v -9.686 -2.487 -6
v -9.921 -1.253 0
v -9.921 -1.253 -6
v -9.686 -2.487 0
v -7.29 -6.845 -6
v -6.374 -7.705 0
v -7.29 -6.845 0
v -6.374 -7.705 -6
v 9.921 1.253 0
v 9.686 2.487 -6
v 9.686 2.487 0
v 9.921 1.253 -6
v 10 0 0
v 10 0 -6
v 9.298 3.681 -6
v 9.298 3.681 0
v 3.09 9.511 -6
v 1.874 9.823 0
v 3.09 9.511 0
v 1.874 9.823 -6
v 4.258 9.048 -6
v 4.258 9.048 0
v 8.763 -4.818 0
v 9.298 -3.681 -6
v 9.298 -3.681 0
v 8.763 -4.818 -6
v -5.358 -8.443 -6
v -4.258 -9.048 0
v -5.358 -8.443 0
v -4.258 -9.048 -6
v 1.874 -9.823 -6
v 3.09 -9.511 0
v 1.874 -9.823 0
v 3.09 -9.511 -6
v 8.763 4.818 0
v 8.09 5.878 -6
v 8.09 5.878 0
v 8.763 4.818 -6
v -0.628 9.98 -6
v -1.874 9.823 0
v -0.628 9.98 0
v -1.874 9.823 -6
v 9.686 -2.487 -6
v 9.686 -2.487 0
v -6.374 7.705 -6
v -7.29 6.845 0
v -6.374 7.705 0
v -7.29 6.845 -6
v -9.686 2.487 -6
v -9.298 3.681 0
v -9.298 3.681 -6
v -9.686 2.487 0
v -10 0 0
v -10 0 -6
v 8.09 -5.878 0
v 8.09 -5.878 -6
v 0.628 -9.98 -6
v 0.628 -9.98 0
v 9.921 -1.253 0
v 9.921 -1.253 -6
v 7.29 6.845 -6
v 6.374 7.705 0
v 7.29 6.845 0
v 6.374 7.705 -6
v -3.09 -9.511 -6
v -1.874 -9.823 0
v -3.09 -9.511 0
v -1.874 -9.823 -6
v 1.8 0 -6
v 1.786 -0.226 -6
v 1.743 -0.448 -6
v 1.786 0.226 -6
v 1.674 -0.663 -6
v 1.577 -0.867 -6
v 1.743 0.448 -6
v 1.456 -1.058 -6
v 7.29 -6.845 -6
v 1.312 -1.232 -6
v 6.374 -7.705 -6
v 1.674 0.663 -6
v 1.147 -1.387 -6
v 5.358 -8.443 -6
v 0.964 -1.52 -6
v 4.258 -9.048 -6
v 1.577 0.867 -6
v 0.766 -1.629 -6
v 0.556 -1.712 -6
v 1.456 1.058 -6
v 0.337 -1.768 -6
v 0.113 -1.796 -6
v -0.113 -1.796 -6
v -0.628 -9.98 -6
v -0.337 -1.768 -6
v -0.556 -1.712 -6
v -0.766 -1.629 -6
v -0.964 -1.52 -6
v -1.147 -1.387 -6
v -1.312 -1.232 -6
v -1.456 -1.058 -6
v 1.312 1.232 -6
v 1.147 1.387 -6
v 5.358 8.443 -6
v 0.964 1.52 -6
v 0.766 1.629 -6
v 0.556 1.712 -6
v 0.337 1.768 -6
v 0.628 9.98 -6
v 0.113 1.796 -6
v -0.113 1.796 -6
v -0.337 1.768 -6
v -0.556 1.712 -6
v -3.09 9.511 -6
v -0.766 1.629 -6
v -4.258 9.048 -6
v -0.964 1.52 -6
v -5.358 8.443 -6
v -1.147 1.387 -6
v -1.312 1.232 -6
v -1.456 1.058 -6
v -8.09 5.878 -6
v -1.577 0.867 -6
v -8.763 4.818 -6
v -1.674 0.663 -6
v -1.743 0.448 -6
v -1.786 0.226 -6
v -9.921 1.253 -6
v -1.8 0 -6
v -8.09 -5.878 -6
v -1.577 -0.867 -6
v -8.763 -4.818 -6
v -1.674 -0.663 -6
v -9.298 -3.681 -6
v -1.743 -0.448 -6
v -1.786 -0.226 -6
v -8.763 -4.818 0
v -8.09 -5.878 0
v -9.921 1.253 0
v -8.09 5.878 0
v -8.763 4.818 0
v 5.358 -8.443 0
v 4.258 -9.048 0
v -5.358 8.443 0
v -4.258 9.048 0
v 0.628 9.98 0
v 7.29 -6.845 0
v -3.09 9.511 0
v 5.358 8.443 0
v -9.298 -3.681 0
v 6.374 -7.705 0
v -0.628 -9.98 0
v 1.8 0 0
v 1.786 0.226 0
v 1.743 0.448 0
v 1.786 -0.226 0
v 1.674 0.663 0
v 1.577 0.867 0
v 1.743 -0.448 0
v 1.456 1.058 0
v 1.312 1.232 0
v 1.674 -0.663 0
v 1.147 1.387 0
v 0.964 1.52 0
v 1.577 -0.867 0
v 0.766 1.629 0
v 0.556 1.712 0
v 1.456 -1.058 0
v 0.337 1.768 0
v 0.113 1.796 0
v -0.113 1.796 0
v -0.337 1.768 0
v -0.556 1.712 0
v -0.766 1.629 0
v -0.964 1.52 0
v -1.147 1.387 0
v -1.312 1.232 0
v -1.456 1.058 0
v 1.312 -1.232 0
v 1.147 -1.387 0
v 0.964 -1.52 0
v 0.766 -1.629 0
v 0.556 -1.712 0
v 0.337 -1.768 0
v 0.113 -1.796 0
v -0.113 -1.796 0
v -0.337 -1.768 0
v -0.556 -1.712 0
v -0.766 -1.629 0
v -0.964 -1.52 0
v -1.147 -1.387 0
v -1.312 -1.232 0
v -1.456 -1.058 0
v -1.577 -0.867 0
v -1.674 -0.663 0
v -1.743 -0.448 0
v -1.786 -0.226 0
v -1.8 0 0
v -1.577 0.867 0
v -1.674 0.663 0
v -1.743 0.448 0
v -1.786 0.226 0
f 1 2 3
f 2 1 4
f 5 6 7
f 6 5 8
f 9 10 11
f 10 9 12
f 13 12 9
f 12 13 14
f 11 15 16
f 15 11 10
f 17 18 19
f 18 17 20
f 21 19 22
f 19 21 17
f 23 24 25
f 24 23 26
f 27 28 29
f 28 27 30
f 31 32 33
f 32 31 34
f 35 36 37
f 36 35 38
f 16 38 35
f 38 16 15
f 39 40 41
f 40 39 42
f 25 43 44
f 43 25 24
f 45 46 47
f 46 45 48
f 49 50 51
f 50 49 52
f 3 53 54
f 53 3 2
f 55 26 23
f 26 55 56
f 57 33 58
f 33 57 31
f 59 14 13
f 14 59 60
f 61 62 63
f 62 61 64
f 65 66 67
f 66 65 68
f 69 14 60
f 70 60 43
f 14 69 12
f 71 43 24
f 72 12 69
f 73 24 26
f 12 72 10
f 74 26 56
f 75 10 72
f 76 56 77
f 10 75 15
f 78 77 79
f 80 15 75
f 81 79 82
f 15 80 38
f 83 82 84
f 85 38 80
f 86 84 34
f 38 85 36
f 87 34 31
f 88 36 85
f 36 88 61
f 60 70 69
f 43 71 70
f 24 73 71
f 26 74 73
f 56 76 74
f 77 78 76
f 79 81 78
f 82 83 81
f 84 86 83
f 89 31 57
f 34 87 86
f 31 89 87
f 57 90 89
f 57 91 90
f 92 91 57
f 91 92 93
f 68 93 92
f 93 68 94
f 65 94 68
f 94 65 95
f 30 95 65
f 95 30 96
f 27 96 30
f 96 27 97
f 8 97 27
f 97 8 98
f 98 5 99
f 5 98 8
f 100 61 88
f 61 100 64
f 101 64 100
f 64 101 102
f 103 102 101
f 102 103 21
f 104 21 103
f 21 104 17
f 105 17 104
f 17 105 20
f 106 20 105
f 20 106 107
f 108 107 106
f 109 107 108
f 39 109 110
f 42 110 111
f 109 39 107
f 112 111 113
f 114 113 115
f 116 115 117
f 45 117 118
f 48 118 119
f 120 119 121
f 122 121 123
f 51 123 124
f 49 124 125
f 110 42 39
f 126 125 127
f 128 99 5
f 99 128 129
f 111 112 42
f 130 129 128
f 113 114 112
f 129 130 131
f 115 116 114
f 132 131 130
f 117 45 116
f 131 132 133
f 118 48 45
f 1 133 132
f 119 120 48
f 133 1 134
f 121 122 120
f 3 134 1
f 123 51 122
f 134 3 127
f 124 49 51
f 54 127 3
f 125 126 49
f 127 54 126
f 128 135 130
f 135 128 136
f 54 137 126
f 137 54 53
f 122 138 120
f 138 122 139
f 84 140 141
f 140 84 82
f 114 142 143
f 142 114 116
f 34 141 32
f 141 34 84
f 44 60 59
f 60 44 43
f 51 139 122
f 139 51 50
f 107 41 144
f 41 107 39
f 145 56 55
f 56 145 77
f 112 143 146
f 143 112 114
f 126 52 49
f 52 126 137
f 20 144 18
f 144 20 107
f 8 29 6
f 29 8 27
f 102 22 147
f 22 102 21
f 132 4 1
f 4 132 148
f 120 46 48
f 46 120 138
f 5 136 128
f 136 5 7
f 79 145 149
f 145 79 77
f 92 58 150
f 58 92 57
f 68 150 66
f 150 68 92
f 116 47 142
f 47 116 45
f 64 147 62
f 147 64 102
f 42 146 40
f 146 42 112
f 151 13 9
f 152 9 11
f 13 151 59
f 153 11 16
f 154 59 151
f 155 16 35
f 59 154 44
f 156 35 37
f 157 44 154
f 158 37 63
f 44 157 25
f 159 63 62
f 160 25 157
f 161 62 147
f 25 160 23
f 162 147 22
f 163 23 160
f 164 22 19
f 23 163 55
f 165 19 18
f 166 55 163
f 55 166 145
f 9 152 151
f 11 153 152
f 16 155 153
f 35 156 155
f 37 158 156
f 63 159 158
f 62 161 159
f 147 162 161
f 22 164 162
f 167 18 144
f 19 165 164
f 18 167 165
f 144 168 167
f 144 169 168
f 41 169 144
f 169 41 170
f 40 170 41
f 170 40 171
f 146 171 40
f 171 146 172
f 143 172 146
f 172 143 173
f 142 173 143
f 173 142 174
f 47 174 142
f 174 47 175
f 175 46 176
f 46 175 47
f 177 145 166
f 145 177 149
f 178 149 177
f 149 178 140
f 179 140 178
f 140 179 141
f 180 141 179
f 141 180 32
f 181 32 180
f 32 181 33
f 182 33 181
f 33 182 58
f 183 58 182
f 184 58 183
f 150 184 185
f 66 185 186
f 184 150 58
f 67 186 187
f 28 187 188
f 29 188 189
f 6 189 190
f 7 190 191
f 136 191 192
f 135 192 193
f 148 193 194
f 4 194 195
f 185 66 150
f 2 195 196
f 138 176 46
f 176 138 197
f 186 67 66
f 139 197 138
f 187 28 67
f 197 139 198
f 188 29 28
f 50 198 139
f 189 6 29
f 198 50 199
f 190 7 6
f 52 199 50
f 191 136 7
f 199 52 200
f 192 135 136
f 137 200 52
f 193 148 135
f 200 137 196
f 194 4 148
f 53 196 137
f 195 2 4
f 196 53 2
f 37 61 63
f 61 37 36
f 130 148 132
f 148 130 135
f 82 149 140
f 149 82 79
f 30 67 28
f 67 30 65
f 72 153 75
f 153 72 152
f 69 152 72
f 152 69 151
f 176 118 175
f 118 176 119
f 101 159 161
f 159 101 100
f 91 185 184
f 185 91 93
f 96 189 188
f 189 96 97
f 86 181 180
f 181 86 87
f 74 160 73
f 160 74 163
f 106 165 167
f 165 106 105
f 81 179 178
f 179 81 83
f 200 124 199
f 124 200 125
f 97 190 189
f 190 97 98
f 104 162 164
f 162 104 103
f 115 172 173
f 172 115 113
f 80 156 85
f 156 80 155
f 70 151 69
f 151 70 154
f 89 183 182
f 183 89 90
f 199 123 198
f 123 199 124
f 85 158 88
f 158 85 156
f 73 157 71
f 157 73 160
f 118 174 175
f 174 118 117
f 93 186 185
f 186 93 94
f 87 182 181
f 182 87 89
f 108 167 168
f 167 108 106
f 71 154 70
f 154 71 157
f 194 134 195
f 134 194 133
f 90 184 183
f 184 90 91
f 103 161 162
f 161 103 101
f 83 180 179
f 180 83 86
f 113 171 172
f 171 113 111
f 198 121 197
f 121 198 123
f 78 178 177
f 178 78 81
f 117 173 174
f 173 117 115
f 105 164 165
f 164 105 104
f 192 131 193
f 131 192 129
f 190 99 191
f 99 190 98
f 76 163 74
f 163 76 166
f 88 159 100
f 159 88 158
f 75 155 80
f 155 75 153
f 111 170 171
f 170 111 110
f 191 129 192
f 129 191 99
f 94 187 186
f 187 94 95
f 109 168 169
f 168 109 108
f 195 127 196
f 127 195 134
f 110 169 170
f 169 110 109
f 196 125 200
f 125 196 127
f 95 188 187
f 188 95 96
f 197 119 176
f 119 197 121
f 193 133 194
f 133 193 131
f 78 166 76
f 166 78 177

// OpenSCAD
$fn = 50;


difference() {
	union() {
		translate(v = [0, 0, -6.0000000000]) {
			cylinder(h = 6, r = 10.0000000000);
		}
		cylinder(h = 0, r = 16.0000000000);
	}
	union() {
		#translate(v = [0, 0, -6]) {
			cylinder(h = 6, r = 1.8000000000);
		}
	}
}
